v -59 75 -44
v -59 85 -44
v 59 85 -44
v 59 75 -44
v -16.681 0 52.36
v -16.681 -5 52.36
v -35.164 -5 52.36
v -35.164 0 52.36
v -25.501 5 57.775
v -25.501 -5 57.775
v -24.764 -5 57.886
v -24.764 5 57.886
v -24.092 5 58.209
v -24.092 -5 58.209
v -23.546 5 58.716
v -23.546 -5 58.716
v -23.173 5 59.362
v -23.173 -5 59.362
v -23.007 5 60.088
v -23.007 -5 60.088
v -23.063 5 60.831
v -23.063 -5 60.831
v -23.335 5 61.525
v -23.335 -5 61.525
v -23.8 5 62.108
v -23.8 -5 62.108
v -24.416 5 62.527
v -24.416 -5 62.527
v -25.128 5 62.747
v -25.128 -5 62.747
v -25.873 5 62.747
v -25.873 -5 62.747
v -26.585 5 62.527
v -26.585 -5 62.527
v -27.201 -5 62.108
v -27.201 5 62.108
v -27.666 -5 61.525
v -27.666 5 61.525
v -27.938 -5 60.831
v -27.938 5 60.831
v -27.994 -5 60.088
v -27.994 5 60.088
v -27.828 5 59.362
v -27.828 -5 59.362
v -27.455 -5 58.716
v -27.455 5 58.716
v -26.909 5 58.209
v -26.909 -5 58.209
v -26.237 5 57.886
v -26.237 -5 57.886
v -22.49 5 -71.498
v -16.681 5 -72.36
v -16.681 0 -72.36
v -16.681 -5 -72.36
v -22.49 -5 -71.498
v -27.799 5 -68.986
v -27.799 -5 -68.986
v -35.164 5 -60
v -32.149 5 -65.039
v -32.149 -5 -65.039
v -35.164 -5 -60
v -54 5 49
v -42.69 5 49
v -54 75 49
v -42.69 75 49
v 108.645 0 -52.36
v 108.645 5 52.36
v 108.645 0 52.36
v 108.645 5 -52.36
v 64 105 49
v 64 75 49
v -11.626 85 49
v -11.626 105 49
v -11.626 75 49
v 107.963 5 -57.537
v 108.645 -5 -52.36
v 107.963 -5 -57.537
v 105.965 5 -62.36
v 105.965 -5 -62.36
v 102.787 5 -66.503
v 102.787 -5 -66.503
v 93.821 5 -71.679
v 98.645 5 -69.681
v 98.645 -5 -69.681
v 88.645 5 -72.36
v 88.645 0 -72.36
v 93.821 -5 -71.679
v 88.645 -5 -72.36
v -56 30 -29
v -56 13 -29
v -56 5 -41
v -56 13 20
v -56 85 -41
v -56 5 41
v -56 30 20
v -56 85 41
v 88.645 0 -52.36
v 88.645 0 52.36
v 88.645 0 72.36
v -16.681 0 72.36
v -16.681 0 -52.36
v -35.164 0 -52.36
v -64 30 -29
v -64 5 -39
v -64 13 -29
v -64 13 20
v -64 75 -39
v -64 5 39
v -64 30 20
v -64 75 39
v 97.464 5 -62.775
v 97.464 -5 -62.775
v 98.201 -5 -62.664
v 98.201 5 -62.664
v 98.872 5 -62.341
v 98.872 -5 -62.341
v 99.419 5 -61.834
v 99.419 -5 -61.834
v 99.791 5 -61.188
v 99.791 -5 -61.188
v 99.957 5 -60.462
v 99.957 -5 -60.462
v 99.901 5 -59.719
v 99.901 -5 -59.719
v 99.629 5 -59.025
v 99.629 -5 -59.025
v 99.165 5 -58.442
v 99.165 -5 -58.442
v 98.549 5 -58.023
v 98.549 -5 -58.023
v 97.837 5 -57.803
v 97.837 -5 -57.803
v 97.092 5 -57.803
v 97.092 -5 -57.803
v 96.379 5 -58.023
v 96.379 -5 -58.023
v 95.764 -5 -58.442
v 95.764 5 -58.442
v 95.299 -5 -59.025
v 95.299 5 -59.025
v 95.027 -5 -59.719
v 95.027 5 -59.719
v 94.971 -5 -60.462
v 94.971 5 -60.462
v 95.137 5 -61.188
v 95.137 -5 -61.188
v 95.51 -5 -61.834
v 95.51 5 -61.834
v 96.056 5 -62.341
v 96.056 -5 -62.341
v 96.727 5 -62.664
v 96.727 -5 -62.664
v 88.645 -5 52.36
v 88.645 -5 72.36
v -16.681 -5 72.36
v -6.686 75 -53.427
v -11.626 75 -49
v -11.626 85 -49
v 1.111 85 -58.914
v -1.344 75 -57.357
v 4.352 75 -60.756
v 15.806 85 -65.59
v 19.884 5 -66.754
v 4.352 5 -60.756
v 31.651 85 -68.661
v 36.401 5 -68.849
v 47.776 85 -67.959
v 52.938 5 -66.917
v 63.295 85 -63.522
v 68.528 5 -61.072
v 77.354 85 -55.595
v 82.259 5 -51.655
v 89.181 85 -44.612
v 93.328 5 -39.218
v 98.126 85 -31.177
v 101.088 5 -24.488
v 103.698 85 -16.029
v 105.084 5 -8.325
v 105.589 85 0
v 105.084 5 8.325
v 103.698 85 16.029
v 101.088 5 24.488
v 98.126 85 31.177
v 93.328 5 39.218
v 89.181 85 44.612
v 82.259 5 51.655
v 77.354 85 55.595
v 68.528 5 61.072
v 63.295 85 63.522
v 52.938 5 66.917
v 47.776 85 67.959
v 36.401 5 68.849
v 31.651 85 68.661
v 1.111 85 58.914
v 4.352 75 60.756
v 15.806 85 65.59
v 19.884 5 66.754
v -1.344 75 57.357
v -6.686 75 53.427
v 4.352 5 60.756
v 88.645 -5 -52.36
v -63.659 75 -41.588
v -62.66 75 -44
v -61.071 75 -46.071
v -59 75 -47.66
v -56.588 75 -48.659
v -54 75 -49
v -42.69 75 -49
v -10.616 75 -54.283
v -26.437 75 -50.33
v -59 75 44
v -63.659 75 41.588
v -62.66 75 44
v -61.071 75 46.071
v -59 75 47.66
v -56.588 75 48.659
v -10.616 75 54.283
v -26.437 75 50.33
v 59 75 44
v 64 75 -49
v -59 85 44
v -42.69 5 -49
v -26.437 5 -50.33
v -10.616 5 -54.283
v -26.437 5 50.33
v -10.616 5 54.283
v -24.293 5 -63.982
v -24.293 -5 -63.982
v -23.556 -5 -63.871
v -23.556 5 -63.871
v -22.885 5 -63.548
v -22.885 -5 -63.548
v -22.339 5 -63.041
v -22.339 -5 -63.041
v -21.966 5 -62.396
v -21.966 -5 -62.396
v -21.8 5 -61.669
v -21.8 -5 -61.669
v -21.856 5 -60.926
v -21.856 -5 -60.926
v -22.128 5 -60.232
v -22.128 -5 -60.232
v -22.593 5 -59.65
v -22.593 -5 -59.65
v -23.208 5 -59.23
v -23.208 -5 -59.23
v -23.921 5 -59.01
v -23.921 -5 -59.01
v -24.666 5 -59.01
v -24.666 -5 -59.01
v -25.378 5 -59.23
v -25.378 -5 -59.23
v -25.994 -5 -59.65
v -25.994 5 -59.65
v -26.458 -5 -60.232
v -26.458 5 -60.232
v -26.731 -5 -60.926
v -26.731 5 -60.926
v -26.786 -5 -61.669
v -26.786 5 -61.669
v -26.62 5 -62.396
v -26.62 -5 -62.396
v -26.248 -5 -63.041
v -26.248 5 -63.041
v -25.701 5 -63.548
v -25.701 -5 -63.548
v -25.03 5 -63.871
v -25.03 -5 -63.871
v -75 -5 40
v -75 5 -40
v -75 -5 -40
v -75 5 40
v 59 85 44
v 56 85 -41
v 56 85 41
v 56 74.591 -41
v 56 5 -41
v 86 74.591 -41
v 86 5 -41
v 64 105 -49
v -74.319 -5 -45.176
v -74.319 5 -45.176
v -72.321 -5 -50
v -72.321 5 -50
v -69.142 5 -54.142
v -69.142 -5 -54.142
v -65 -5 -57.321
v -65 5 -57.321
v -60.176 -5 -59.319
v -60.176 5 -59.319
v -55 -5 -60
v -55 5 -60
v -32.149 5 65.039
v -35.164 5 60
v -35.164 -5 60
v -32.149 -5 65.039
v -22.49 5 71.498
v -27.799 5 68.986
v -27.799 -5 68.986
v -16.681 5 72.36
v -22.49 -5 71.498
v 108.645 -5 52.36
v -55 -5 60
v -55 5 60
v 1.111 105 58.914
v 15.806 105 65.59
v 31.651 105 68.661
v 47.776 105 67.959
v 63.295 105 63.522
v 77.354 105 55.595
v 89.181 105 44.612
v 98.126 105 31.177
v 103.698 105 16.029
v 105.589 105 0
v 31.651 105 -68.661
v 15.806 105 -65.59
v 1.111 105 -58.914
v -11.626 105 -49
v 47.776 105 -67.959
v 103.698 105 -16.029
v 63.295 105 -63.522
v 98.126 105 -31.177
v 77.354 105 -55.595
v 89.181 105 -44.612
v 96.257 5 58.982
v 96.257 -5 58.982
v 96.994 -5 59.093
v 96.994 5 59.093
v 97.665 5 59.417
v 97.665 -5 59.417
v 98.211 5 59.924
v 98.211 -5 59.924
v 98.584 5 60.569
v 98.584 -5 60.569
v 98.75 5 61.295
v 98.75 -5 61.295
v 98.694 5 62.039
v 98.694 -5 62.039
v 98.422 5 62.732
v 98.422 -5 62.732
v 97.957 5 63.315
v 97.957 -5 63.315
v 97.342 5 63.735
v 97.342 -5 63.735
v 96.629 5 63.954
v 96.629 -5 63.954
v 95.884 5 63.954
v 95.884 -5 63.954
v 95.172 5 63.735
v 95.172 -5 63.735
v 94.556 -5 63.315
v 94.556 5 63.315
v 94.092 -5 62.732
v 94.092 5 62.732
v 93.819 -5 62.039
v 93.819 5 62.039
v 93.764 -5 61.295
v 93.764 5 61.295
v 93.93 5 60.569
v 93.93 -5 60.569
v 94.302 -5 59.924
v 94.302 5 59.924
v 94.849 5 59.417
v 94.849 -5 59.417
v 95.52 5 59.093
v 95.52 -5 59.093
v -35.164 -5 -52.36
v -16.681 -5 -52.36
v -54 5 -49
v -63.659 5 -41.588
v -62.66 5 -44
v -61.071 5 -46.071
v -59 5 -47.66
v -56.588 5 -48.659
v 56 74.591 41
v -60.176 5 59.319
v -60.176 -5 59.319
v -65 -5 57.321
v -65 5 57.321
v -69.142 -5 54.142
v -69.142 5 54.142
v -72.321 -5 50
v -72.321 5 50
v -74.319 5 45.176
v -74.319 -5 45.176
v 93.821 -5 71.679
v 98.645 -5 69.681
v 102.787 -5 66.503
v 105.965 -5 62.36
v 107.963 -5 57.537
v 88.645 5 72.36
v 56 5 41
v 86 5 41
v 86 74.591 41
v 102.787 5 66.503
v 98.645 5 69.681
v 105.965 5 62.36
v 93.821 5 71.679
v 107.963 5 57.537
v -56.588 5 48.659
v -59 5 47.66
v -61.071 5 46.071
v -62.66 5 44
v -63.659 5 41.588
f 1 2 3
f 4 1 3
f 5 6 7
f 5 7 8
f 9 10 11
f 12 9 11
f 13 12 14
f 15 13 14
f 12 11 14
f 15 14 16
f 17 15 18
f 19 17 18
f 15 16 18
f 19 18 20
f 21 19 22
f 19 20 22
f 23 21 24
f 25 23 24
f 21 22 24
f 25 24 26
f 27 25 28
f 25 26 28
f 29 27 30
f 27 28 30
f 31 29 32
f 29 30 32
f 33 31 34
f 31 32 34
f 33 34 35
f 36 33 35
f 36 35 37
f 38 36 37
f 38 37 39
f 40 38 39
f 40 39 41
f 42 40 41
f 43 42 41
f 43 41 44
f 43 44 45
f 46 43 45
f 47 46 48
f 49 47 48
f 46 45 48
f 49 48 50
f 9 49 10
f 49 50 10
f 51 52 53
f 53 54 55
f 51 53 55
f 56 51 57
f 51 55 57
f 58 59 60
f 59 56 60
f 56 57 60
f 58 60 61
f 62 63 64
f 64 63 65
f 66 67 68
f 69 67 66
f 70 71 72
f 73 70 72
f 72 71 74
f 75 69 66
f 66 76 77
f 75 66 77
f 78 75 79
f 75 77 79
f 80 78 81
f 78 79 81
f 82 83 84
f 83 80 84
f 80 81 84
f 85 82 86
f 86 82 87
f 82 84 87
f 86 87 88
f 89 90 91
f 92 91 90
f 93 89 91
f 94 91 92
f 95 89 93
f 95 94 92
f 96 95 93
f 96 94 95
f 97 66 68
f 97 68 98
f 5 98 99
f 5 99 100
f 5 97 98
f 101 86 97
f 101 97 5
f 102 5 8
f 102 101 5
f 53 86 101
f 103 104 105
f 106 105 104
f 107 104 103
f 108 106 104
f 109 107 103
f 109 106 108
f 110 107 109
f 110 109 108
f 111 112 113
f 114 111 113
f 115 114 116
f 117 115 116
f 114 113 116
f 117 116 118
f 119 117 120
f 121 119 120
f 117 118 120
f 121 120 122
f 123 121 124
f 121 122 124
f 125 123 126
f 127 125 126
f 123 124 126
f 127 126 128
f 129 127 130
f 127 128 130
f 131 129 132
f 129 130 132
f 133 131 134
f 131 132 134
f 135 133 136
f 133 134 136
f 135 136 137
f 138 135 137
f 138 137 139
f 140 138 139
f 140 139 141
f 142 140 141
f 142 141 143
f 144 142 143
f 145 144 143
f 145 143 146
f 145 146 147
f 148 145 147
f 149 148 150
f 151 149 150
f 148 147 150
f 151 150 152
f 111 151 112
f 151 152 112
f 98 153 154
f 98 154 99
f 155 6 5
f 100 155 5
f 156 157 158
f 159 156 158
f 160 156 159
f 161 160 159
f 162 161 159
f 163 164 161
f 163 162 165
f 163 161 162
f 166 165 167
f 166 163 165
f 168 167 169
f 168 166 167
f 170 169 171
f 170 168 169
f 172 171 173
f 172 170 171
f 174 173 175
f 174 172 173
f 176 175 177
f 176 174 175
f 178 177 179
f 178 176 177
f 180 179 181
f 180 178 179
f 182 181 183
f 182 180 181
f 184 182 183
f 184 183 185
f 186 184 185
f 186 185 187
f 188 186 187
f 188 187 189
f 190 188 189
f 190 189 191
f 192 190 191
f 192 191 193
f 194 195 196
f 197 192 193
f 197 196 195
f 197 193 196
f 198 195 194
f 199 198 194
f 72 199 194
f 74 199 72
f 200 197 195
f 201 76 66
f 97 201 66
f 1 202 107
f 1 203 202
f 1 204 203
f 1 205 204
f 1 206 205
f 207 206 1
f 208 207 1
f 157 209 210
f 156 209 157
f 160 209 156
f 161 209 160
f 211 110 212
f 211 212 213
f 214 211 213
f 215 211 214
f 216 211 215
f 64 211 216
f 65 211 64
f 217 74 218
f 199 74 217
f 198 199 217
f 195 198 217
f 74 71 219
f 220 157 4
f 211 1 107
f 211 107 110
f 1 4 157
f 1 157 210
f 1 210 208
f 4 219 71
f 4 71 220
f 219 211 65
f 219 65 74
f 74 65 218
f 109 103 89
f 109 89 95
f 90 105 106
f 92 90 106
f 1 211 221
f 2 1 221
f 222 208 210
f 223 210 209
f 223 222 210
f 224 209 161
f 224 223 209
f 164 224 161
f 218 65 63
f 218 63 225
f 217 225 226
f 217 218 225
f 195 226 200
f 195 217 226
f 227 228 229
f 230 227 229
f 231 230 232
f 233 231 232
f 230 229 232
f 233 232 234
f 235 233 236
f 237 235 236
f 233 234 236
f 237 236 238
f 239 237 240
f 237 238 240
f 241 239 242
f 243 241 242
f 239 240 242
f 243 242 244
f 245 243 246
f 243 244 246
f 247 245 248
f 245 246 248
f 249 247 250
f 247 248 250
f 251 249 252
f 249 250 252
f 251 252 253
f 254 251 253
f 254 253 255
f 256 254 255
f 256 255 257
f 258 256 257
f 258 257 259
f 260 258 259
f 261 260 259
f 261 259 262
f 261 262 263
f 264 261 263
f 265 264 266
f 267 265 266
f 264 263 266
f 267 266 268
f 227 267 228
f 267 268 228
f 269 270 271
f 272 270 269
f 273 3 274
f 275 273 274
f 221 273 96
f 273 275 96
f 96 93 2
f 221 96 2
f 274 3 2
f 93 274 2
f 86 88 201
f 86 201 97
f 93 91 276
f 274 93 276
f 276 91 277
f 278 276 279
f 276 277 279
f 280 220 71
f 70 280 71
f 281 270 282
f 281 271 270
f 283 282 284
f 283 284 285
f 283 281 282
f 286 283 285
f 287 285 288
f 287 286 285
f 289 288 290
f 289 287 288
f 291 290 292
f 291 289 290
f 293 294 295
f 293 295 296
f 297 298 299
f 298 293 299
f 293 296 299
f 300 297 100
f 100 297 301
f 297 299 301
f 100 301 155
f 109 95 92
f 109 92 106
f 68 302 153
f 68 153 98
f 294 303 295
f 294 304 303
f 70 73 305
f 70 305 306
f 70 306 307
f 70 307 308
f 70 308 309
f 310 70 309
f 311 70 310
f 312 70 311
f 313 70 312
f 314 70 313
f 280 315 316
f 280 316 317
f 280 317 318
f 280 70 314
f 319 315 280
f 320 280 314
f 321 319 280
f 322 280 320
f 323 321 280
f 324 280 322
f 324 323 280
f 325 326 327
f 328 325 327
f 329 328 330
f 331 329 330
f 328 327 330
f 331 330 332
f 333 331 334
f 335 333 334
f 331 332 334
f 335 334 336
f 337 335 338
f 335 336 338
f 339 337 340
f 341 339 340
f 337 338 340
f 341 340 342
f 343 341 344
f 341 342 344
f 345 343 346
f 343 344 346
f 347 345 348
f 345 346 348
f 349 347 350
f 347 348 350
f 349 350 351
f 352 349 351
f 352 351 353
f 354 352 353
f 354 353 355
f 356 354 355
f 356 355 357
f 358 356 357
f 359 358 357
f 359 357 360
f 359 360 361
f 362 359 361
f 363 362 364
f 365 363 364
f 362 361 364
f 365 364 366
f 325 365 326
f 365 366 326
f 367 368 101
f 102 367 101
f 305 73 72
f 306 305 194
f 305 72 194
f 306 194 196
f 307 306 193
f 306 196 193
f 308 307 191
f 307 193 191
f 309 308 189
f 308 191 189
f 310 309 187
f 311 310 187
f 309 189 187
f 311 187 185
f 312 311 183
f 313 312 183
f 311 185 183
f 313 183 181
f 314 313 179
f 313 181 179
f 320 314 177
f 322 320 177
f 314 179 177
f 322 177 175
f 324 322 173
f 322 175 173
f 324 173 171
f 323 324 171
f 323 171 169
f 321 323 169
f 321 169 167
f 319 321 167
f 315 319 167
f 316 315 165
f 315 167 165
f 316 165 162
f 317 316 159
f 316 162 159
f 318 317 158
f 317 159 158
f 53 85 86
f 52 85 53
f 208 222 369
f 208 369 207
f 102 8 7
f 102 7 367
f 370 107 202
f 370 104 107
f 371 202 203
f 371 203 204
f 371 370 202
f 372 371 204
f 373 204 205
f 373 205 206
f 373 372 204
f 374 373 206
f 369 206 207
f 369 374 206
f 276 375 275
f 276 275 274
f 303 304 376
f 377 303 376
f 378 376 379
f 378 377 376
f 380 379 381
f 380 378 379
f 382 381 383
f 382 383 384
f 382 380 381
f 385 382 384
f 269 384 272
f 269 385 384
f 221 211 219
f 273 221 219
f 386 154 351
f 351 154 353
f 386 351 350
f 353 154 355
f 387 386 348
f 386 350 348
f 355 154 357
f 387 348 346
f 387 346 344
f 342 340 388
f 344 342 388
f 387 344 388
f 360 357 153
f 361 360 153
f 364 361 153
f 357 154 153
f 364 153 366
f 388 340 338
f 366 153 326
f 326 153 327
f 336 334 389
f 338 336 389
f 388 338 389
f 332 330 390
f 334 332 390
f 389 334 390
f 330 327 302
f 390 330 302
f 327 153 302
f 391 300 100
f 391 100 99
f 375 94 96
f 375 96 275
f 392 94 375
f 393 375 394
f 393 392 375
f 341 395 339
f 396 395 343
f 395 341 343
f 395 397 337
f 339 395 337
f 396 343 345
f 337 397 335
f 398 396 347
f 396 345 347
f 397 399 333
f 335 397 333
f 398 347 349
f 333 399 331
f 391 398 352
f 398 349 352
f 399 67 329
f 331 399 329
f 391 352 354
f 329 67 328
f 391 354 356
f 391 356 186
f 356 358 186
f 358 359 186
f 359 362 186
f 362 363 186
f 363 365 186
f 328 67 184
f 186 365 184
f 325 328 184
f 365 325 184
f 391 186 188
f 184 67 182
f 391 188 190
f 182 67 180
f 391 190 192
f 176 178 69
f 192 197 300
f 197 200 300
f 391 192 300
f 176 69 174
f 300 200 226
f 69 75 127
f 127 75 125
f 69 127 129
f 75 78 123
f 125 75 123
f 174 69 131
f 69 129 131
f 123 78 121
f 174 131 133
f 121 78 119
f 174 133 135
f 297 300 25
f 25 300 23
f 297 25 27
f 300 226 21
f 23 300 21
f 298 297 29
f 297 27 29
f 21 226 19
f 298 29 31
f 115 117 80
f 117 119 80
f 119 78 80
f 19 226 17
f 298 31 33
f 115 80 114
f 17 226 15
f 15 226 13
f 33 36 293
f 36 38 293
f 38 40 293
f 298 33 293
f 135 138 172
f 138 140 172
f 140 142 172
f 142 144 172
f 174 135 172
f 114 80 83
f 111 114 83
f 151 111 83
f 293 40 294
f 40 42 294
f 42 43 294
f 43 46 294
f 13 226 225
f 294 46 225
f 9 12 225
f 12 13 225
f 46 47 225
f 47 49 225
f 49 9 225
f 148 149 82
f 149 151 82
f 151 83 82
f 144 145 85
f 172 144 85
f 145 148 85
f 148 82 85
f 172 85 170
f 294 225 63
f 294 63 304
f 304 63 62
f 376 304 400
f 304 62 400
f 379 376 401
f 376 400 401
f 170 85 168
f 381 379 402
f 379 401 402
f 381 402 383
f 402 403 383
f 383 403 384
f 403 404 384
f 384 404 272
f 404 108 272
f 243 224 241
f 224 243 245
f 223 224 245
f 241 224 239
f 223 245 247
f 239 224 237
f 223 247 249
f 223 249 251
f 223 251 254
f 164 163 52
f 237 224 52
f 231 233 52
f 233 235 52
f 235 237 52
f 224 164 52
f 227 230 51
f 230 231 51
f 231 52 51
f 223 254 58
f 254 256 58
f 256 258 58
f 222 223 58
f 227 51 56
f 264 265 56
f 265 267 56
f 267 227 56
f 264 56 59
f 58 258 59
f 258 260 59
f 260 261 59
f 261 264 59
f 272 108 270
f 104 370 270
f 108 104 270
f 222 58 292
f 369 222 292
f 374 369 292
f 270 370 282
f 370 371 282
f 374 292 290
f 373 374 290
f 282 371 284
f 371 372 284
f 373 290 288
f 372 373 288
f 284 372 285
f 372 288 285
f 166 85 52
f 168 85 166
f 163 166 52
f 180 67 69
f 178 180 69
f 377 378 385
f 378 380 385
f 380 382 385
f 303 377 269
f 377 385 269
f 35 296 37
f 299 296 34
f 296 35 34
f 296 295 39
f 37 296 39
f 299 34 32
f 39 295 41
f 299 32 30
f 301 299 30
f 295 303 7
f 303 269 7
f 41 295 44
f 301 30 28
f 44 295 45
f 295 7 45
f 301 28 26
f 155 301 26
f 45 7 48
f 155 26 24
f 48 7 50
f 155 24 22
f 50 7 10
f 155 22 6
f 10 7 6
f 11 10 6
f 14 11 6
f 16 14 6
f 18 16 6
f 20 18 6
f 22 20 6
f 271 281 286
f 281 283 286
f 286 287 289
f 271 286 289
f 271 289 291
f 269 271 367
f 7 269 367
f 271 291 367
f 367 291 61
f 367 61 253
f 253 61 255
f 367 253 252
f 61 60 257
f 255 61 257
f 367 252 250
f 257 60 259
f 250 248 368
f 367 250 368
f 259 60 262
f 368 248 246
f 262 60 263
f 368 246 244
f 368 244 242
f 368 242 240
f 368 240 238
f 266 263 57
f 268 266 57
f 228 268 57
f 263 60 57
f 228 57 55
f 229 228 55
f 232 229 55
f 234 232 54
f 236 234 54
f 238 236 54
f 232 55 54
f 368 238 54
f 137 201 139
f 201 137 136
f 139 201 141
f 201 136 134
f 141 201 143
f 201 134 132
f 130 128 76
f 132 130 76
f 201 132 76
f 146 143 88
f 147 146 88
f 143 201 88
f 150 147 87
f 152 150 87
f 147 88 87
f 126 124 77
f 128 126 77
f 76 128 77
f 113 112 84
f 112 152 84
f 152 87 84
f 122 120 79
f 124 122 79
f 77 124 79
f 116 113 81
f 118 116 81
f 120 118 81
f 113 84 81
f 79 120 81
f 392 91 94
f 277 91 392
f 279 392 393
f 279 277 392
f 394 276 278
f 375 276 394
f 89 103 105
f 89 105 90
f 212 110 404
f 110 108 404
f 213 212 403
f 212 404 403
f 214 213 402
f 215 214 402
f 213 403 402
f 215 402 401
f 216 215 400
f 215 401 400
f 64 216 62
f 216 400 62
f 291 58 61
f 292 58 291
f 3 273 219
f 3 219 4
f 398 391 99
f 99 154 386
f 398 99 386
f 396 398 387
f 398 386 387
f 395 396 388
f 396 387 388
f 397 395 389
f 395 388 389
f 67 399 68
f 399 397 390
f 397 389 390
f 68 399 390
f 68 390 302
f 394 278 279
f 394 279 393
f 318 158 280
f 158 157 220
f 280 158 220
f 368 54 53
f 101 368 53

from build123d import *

# Parameters (mm, degrees)
CROQUIS2_W               = 118
CROQUIS2_H               = 88
SALIENTE_EXTRUIR1_DEPTH  = 5
CROQUIS3_W               = 118
CROQUIS3_H               = 88
CROQUIS3_W_2             = 112
CROQUIS3_H_2             = 82
SALIENTE_EXTRUIR2_DEPTH  = 80
CROQUIS4_W               = 150
CROQUIS4_H               = 120
SALIENTE_EXTRUIR3_DEPTH  = 5
CROQUIS7_W               = 60
CROQUIS7_H               = 17
CORTAR_EXTRUIR3_DEPTH    = 5
CROQUIS8_W               = 3
CROQUIS8_H               = 17
SALIENTE_EXTRUIR4_DEPTH  = 4
CROQUIS9_W               = 3
CROQUIS9_H               = 17
SALIENTE_EXTRUIR5_DEPTH  = 7
CROQUIS10_W              = 118
CROQUIS10_H              = 5
SALIENTE_EXTRUIR6_DEPTH  = 5
CROQUIS11_W              = 93
CROQUIS11_H              = 5
SALIENTE_EXTRUIR7_DEPTH  = 5
CROQUIS12_W              = 123
CROQUIS12_H              = 5
SALIENTE_EXTRUIR8_DEPTH  = 5
CROQUIS13_W              = 98
CROQUIS13_H              = 5
SALIENTE_EXTRUIR9_DEPTH  = 5
SALIENTE_EXTRUIR11_DEPTH = 85
CORTAR_EXTRUIR4_DEPTH    = 10
SALIENTE_EXTRUIR12_DEPTH = 70
CROQUIS21_W              = 49
CROQUIS21_H              = 17
CORTAR_EXTRUIR5_DEPTH    = 70
REDONDEO4_R              = 10
REDONDEO5_R              = 100
SALIENTE_EXTRUIR13_DEPTH = 20
CROQUIS23_W              = 143.80914693
CROQUIS23_H              = 144.72077086
CROQUIS23_R              = 24.004265162
SALIENTE_EXTRUIR14_DEPTH = 5
SALIENTE_EXTRUIR15_DEPTH = 5
REDONDEO9_R              = 20
CROQUIS27_W              = 105.325741151
CROQUIS27_H              = 5
CORTAR_EXTRUIR7_DEPTH    = 210.21942266
CROQUIS28_W              = 104.72077086
CROQUIS28_H              = 5
CORTAR_EXTRUIR8_DEPTH    = 143.809145
CROQUIS29_R              = 2.5
CORTAR_EXTRUIR9_DEPTH    = 10
REDONDEO10_R             = 20
CROQUIS30_W              = 82
CROQUIS30_H              = 69.590652645
CORTAR_EXTRUIR10_DEPTH   = 30


with BuildPart() as part:
    # Croquis2 → Saliente-Extruir1 (new body)
    with BuildSketch(Plane(origin=(0, 0, 0), x_dir=(1, 0, 0), z_dir=(0, 1, 0))):
        Rectangle(CROQUIS2_W, CROQUIS2_H)
    extrude(amount=SALIENTE_EXTRUIR1_DEPTH)

    # Croquis3 → Saliente-Extruir2 (add)
    with BuildSketch(Plane(origin=(0, 5, 0), x_dir=(1, 0, 0), z_dir=(0, 1, 0))):
        Rectangle(CROQUIS3_W, CROQUIS3_H)
        Rectangle(CROQUIS3_W_2, CROQUIS3_H_2, mode=Mode.SUBTRACT)
    extrude(amount=SALIENTE_EXTRUIR2_DEPTH)

    # Croquis4 → Saliente-Extruir3 (add)
    with BuildSketch(Plane.XZ):
        Rectangle(CROQUIS4_W, CROQUIS4_H)
    extrude(amount=-SALIENTE_EXTRUIR3_DEPTH)

    # Croquis7 → Cortar-Extruir3 (cut)
    with BuildSketch(Plane.ZY.offset(59)):
        with Locations((-3, 21.5)):
            Rectangle(CROQUIS7_W, CROQUIS7_H)
    extrude(amount=-CORTAR_EXTRUIR3_DEPTH, mode=Mode.SUBTRACT)

    # Croquis8 → Saliente-Extruir4 (add)
    with BuildSketch(Plane.XY.offset(-33)):
        with Locations((-57.5, 21.5)):
            Rectangle(CROQUIS8_W, CROQUIS8_H)
    extrude(amount=SALIENTE_EXTRUIR4_DEPTH)

    # Croquis9 → Saliente-Extruir5 (add)
    with BuildSketch(Plane(origin=(0, 0, 27), x_dir=(-1, 0, 0), z_dir=(0, 0, -1))):
        with Locations((57.5, 21.5)):
            Rectangle(CROQUIS9_W, CROQUIS9_H)
    extrude(amount=SALIENTE_EXTRUIR5_DEPTH)

    # Croquis10 → Saliente-Extruir6 (add)
    with BuildSketch(Plane.XY.offset(44)):
        with Locations((0, 72.5)):
            Rectangle(CROQUIS10_W, CROQUIS10_H)
    extrude(amount=SALIENTE_EXTRUIR6_DEPTH)

    # Croquis11 → Saliente-Extruir7 (add)
    with BuildSketch(Plane(origin=(59, 0, 0), x_dir=(0, 0, -1), z_dir=(1, 0, 0))):
        with Locations((-2.5, 72.5)):
            Rectangle(CROQUIS11_W, CROQUIS11_H)
    extrude(amount=SALIENTE_EXTRUIR7_DEPTH)

    # Croquis12 → Saliente-Extruir8 (add)
    with BuildSketch(Plane(origin=(0, 0, -44), x_dir=(-1, 0, 0), z_dir=(0, 0, -1))):
        with Locations((-2.5, 72.5)):
            Rectangle(CROQUIS12_W, CROQUIS12_H)
    extrude(amount=SALIENTE_EXTRUIR8_DEPTH)

    # Croquis13 → Saliente-Extruir9 (add)
    with BuildSketch(Plane.ZY.offset(59)):
        with Locations((0, 72.5)):
            Rectangle(CROQUIS13_W, CROQUIS13_H)
    extrude(amount=SALIENTE_EXTRUIR9_DEPTH)

    # Croquis16 → Saliente-Extruir11 (add)
    with BuildSketch(Plane(origin=(0, 0, 0), x_dir=(-1, 0, 0), z_dir=(0, -1, 0))):
        with BuildLine():
            Line((-59, 44), (16.214965512, 44))
            ThreePointArc((16.214965512, 44), (-105.589495195, 0), (16.214965512, -44))
            Line((16.214965512, -44), (-59, -44))
            Line((-59, -44), (-59, 44))
        make_face()
    extrude(amount=-SALIENTE_EXTRUIR11_DEPTH)

    # Croquis18 → Cortar-Extruir4 (cut)
    with BuildSketch(Plane(origin=(0, 85, 0), x_dir=(1, 0, 0), z_dir=(0, 1, 0))):
        Polygon((-64, 49), (-8.415102712, 49), (63.361111922, 49), (64, 49), (64, 44), (64, -44), (64, -49), (63.361111922, -49), (-8.415102712, -49), (-64, -49), (-64, -44), (-16.214965512, -44), (59, -44), (59, 44), (-16.214965512, 44), (-64, 44), align=None)
    extrude(amount=-CORTAR_EXTRUIR4_DEPTH, mode=Mode.SUBTRACT)

    # Croquis19 → Saliente-Extruir12 (add)
    with BuildSketch(Plane(origin=(0, 5, 0), x_dir=(1, 0, 0), z_dir=(0, 1, 0))):
        Polygon((-16.214965512, -44), (-59, -44), (-59, 44), (-16.214965512, 44), (3.50341587, 44), (3.50341587, 49), (-8.415102712, 49), (-64, 49), (-64, -49), (-8.415102712, -49), (4.243498443, -49), (4.243498443, -44), align=None)
    extrude(amount=SALIENTE_EXTRUIR12_DEPTH)

    # Croquis21 → Cortar-Extruir5 (cut)
    with BuildSketch(Plane(origin=(-56, 0, 0), x_dir=(0, 0, -1), z_dir=(1, 0, 0))):
        with Locations((4.5, 21.5)):
            Rectangle(CROQUIS21_W, CROQUIS21_H)
    extrude(amount=-CORTAR_EXTRUIR5_DEPTH, mode=Mode.SUBTRACT)

    # Redondeo4
    redondeo4_edges = [part.edges().sort_by_distance(p)[0] for p in [
        (-64, 40, -49),
        (-64, 40, 49),
    ]]
    fillet(redondeo4_edges, radius=REDONDEO4_R)

    # Redondeo5
    redondeo5_edges = [part.edges().sort_by_distance(p)[0] for p in [
        (-11.625579702, 40, -49),
        (-11.625579702, 40, 49),
    ]]
    fillet(redondeo5_edges, radius=REDONDEO5_R)

    # Croquis22 → Saliente-Extruir13 (add)
    with BuildSketch(Plane(origin=(0, 85, 0), x_dir=(1, 0, 0), z_dir=(0, 1, 0))):
        with BuildLine():
            Line((64, -49), (4.315842741, -49))
            Line((4.315842741, -49), (-11.625579493, -49))
            ThreePointArc((-11.625579493, -49), (105.589495048, 0), (-11.625579493, 49))
            Line((-11.625579493, 49), (4.315842741, 49))
            Line((4.315842741, 49), (64, 49))
            Line((64, 49), (64, -49))
        make_face()
    extrude(amount=SALIENTE_EXTRUIR13_DEPTH)

    # Croquis23 → Saliente-Extruir14 (add)
    with BuildSketch(Plane(origin=(0, 0, 0), x_dir=(-1, 0, 0), z_dir=(0, -1, 0))):
        with Locations((-36.740101048, 0)):
            Rectangle(CROQUIS23_W, CROQUIS23_H)
        with Locations((-36.740101048, 0)):
            Circle(CROQUIS23_R, mode=Mode.SUBTRACT)
    extrude(amount=-SALIENTE_EXTRUIR14_DEPTH)

    # Croquis25 → Saliente-Extruir15 (add)
    with BuildSketch(Plane(origin=(0, 0, 0), x_dir=(-1, 0, 0), z_dir=(0, -1, 0))):
        Polygon((35.164472417, -60), (35.164472417, -72.36038543), (-108.644674513, -72.36038543), (-108.644674513, 72.36038543), (35.164472417, 72.36038543), (35.164472417, 60), (75, 60), (75, -60), align=None)
    extrude(amount=SALIENTE_EXTRUIR15_DEPTH)

    # Redondeo9
    # the kernel refuses this fillet: 20 mm, written as the material it takes off along each edge
    with BuildSketch(Plane(origin=(108.644674513, -55, -72.36038543), x_dir=(-1, 0, 0), z_dir=(0, 1, 0)), Plane(origin=(108.644674513, -55, 72.36038543), x_dir=(0, 0, -1), z_dir=(0, 1, 0))) as redondeo9_piece_1:
        with BuildLine():
            CenterArc((REDONDEO9_R, REDONDEO9_R), REDONDEO9_R, 180, 90)
            Line((0, REDONDEO9_R), (-REDONDEO9_R * 0.02, REDONDEO9_R))
            Line((-REDONDEO9_R * 0.02, REDONDEO9_R), (-REDONDEO9_R * 0.02, -REDONDEO9_R * 0.02))
            Line((-REDONDEO9_R * 0.02, -REDONDEO9_R * 0.02), (REDONDEO9_R, -REDONDEO9_R * 0.02))
            Line((REDONDEO9_R, -REDONDEO9_R * 0.02), (REDONDEO9_R, 0))
        make_face()
    extrude(amount=110, mode=Mode.SUBTRACT)
    with BuildSketch(Plane(origin=(-35.164472417, -51.20851445, 72.36038543), x_dir=(1, 0, 0), z_dir=(0, 1, 0))) as redondeo9_piece_2:
        with BuildLine():
            CenterArc((18.48340578, 20), REDONDEO9_R, 202.456427621, 67.543572379)
            Line((0, 12.36038543), (-0.369668116, 12.207593139))
            ThreePointArc((-0.369668116, 12.207593139), (-0.4, 6.180192715), (-0.4, 0))
            Line((-0.4, 0), (0, -0.4))
            Line((0, -0.4), (18.48340578, -0.4))
            Line((18.48340578, -0.4), (18.48340578, 0))
        make_face()
    extrude(amount=102.417028899, mode=Mode.SUBTRACT)
    with BuildSketch(Plane(origin=(-35.164472417, -51.20851445, -72.36038543), x_dir=(0, 0, 1), z_dir=(0, 1, 0))) as redondeo9_piece_3:
        with BuildLine():
            CenterArc((20, 18.48340578), REDONDEO9_R, 180, 67.543572379)
            Line((0, 18.48340578), (-0.4, 18.48340578))
            Line((-0.4, 18.48340578), (-0.4, 0))
            Line((-0.4, 0), (0, -0.4))
            ThreePointArc((0, -0.4), (6.180192715, -0.4), (12.207593139, -0.369668116))
            Line((12.207593139, -0.369668116), (12.36038543, 0))
        make_face()
    extrude(amount=102.417028899, mode=Mode.SUBTRACT)

    # Croquis27 → Cortar-Extruir7 (cut, through all)
    with BuildSketch(Plane(origin=(0, 0, -72.36038543), x_dir=(-1, 0, 0), z_dir=(0, 0, -1))):
        with Locations((-35.981803938, -2.5)):
            Rectangle(CROQUIS27_W, CROQUIS27_H)
    extrude(amount=-CORTAR_EXTRUIR7_DEPTH, mode=Mode.SUBTRACT)

    # Croquis28 → Cortar-Extruir8 (cut)
    with BuildSketch(Plane(origin=(108.644674513, 0, 0), x_dir=(0, 0, -1), z_dir=(1, 0, 0))):
        with Locations((0, -2.5)):
            Rectangle(CROQUIS28_W, CROQUIS28_H)
    extrude(amount=-CORTAR_EXTRUIR8_DEPTH, mode=Mode.SUBTRACT)

    # Croquis29 → Cortar-Extruir9 (cut)
    with BuildSketch(Plane(origin=(0, -5, 0), x_dir=(-1, 0, 0), z_dir=(0, -1, 0))):
        with Locations(Location((-96.256800969, -61.48231173, 0), (0, 0, 90))):
            Circle(CROQUIS29_R)
        with Locations(Location((-97.464115668, 60.274997031, 0), (0, 0, 90))):
            Circle(CROQUIS29_R)
        with Locations(Location((24.293193094, 61.48231173, 0), (0, 0, 90))):
            Circle(CROQUIS29_R)
        with Locations(Location((25.500507793, -60.274997031, 0), (0, 0, 90))):
            Circle(CROQUIS29_R)
    extrude(amount=-CORTAR_EXTRUIR9_DEPTH, mode=Mode.SUBTRACT)

    # Redondeo10
    redondeo10_edges = [part.edges().sort_by_distance(p)[0] for p in [
        (-75, 0, -60),
        (-75, 0, 60),
    ]]
    fillet(redondeo10_edges, radius=REDONDEO10_R)

    # Croquis30 → Cortar-Extruir10 (cut)
    with BuildSketch(Plane.ZY.offset(-56)):
        with Locations((0, 39.795326323)):
            Rectangle(CROQUIS30_W, CROQUIS30_H)
    extrude(amount=-CORTAR_EXTRUIR10_DEPTH, mode=Mode.SUBTRACT)


solid = part.part
